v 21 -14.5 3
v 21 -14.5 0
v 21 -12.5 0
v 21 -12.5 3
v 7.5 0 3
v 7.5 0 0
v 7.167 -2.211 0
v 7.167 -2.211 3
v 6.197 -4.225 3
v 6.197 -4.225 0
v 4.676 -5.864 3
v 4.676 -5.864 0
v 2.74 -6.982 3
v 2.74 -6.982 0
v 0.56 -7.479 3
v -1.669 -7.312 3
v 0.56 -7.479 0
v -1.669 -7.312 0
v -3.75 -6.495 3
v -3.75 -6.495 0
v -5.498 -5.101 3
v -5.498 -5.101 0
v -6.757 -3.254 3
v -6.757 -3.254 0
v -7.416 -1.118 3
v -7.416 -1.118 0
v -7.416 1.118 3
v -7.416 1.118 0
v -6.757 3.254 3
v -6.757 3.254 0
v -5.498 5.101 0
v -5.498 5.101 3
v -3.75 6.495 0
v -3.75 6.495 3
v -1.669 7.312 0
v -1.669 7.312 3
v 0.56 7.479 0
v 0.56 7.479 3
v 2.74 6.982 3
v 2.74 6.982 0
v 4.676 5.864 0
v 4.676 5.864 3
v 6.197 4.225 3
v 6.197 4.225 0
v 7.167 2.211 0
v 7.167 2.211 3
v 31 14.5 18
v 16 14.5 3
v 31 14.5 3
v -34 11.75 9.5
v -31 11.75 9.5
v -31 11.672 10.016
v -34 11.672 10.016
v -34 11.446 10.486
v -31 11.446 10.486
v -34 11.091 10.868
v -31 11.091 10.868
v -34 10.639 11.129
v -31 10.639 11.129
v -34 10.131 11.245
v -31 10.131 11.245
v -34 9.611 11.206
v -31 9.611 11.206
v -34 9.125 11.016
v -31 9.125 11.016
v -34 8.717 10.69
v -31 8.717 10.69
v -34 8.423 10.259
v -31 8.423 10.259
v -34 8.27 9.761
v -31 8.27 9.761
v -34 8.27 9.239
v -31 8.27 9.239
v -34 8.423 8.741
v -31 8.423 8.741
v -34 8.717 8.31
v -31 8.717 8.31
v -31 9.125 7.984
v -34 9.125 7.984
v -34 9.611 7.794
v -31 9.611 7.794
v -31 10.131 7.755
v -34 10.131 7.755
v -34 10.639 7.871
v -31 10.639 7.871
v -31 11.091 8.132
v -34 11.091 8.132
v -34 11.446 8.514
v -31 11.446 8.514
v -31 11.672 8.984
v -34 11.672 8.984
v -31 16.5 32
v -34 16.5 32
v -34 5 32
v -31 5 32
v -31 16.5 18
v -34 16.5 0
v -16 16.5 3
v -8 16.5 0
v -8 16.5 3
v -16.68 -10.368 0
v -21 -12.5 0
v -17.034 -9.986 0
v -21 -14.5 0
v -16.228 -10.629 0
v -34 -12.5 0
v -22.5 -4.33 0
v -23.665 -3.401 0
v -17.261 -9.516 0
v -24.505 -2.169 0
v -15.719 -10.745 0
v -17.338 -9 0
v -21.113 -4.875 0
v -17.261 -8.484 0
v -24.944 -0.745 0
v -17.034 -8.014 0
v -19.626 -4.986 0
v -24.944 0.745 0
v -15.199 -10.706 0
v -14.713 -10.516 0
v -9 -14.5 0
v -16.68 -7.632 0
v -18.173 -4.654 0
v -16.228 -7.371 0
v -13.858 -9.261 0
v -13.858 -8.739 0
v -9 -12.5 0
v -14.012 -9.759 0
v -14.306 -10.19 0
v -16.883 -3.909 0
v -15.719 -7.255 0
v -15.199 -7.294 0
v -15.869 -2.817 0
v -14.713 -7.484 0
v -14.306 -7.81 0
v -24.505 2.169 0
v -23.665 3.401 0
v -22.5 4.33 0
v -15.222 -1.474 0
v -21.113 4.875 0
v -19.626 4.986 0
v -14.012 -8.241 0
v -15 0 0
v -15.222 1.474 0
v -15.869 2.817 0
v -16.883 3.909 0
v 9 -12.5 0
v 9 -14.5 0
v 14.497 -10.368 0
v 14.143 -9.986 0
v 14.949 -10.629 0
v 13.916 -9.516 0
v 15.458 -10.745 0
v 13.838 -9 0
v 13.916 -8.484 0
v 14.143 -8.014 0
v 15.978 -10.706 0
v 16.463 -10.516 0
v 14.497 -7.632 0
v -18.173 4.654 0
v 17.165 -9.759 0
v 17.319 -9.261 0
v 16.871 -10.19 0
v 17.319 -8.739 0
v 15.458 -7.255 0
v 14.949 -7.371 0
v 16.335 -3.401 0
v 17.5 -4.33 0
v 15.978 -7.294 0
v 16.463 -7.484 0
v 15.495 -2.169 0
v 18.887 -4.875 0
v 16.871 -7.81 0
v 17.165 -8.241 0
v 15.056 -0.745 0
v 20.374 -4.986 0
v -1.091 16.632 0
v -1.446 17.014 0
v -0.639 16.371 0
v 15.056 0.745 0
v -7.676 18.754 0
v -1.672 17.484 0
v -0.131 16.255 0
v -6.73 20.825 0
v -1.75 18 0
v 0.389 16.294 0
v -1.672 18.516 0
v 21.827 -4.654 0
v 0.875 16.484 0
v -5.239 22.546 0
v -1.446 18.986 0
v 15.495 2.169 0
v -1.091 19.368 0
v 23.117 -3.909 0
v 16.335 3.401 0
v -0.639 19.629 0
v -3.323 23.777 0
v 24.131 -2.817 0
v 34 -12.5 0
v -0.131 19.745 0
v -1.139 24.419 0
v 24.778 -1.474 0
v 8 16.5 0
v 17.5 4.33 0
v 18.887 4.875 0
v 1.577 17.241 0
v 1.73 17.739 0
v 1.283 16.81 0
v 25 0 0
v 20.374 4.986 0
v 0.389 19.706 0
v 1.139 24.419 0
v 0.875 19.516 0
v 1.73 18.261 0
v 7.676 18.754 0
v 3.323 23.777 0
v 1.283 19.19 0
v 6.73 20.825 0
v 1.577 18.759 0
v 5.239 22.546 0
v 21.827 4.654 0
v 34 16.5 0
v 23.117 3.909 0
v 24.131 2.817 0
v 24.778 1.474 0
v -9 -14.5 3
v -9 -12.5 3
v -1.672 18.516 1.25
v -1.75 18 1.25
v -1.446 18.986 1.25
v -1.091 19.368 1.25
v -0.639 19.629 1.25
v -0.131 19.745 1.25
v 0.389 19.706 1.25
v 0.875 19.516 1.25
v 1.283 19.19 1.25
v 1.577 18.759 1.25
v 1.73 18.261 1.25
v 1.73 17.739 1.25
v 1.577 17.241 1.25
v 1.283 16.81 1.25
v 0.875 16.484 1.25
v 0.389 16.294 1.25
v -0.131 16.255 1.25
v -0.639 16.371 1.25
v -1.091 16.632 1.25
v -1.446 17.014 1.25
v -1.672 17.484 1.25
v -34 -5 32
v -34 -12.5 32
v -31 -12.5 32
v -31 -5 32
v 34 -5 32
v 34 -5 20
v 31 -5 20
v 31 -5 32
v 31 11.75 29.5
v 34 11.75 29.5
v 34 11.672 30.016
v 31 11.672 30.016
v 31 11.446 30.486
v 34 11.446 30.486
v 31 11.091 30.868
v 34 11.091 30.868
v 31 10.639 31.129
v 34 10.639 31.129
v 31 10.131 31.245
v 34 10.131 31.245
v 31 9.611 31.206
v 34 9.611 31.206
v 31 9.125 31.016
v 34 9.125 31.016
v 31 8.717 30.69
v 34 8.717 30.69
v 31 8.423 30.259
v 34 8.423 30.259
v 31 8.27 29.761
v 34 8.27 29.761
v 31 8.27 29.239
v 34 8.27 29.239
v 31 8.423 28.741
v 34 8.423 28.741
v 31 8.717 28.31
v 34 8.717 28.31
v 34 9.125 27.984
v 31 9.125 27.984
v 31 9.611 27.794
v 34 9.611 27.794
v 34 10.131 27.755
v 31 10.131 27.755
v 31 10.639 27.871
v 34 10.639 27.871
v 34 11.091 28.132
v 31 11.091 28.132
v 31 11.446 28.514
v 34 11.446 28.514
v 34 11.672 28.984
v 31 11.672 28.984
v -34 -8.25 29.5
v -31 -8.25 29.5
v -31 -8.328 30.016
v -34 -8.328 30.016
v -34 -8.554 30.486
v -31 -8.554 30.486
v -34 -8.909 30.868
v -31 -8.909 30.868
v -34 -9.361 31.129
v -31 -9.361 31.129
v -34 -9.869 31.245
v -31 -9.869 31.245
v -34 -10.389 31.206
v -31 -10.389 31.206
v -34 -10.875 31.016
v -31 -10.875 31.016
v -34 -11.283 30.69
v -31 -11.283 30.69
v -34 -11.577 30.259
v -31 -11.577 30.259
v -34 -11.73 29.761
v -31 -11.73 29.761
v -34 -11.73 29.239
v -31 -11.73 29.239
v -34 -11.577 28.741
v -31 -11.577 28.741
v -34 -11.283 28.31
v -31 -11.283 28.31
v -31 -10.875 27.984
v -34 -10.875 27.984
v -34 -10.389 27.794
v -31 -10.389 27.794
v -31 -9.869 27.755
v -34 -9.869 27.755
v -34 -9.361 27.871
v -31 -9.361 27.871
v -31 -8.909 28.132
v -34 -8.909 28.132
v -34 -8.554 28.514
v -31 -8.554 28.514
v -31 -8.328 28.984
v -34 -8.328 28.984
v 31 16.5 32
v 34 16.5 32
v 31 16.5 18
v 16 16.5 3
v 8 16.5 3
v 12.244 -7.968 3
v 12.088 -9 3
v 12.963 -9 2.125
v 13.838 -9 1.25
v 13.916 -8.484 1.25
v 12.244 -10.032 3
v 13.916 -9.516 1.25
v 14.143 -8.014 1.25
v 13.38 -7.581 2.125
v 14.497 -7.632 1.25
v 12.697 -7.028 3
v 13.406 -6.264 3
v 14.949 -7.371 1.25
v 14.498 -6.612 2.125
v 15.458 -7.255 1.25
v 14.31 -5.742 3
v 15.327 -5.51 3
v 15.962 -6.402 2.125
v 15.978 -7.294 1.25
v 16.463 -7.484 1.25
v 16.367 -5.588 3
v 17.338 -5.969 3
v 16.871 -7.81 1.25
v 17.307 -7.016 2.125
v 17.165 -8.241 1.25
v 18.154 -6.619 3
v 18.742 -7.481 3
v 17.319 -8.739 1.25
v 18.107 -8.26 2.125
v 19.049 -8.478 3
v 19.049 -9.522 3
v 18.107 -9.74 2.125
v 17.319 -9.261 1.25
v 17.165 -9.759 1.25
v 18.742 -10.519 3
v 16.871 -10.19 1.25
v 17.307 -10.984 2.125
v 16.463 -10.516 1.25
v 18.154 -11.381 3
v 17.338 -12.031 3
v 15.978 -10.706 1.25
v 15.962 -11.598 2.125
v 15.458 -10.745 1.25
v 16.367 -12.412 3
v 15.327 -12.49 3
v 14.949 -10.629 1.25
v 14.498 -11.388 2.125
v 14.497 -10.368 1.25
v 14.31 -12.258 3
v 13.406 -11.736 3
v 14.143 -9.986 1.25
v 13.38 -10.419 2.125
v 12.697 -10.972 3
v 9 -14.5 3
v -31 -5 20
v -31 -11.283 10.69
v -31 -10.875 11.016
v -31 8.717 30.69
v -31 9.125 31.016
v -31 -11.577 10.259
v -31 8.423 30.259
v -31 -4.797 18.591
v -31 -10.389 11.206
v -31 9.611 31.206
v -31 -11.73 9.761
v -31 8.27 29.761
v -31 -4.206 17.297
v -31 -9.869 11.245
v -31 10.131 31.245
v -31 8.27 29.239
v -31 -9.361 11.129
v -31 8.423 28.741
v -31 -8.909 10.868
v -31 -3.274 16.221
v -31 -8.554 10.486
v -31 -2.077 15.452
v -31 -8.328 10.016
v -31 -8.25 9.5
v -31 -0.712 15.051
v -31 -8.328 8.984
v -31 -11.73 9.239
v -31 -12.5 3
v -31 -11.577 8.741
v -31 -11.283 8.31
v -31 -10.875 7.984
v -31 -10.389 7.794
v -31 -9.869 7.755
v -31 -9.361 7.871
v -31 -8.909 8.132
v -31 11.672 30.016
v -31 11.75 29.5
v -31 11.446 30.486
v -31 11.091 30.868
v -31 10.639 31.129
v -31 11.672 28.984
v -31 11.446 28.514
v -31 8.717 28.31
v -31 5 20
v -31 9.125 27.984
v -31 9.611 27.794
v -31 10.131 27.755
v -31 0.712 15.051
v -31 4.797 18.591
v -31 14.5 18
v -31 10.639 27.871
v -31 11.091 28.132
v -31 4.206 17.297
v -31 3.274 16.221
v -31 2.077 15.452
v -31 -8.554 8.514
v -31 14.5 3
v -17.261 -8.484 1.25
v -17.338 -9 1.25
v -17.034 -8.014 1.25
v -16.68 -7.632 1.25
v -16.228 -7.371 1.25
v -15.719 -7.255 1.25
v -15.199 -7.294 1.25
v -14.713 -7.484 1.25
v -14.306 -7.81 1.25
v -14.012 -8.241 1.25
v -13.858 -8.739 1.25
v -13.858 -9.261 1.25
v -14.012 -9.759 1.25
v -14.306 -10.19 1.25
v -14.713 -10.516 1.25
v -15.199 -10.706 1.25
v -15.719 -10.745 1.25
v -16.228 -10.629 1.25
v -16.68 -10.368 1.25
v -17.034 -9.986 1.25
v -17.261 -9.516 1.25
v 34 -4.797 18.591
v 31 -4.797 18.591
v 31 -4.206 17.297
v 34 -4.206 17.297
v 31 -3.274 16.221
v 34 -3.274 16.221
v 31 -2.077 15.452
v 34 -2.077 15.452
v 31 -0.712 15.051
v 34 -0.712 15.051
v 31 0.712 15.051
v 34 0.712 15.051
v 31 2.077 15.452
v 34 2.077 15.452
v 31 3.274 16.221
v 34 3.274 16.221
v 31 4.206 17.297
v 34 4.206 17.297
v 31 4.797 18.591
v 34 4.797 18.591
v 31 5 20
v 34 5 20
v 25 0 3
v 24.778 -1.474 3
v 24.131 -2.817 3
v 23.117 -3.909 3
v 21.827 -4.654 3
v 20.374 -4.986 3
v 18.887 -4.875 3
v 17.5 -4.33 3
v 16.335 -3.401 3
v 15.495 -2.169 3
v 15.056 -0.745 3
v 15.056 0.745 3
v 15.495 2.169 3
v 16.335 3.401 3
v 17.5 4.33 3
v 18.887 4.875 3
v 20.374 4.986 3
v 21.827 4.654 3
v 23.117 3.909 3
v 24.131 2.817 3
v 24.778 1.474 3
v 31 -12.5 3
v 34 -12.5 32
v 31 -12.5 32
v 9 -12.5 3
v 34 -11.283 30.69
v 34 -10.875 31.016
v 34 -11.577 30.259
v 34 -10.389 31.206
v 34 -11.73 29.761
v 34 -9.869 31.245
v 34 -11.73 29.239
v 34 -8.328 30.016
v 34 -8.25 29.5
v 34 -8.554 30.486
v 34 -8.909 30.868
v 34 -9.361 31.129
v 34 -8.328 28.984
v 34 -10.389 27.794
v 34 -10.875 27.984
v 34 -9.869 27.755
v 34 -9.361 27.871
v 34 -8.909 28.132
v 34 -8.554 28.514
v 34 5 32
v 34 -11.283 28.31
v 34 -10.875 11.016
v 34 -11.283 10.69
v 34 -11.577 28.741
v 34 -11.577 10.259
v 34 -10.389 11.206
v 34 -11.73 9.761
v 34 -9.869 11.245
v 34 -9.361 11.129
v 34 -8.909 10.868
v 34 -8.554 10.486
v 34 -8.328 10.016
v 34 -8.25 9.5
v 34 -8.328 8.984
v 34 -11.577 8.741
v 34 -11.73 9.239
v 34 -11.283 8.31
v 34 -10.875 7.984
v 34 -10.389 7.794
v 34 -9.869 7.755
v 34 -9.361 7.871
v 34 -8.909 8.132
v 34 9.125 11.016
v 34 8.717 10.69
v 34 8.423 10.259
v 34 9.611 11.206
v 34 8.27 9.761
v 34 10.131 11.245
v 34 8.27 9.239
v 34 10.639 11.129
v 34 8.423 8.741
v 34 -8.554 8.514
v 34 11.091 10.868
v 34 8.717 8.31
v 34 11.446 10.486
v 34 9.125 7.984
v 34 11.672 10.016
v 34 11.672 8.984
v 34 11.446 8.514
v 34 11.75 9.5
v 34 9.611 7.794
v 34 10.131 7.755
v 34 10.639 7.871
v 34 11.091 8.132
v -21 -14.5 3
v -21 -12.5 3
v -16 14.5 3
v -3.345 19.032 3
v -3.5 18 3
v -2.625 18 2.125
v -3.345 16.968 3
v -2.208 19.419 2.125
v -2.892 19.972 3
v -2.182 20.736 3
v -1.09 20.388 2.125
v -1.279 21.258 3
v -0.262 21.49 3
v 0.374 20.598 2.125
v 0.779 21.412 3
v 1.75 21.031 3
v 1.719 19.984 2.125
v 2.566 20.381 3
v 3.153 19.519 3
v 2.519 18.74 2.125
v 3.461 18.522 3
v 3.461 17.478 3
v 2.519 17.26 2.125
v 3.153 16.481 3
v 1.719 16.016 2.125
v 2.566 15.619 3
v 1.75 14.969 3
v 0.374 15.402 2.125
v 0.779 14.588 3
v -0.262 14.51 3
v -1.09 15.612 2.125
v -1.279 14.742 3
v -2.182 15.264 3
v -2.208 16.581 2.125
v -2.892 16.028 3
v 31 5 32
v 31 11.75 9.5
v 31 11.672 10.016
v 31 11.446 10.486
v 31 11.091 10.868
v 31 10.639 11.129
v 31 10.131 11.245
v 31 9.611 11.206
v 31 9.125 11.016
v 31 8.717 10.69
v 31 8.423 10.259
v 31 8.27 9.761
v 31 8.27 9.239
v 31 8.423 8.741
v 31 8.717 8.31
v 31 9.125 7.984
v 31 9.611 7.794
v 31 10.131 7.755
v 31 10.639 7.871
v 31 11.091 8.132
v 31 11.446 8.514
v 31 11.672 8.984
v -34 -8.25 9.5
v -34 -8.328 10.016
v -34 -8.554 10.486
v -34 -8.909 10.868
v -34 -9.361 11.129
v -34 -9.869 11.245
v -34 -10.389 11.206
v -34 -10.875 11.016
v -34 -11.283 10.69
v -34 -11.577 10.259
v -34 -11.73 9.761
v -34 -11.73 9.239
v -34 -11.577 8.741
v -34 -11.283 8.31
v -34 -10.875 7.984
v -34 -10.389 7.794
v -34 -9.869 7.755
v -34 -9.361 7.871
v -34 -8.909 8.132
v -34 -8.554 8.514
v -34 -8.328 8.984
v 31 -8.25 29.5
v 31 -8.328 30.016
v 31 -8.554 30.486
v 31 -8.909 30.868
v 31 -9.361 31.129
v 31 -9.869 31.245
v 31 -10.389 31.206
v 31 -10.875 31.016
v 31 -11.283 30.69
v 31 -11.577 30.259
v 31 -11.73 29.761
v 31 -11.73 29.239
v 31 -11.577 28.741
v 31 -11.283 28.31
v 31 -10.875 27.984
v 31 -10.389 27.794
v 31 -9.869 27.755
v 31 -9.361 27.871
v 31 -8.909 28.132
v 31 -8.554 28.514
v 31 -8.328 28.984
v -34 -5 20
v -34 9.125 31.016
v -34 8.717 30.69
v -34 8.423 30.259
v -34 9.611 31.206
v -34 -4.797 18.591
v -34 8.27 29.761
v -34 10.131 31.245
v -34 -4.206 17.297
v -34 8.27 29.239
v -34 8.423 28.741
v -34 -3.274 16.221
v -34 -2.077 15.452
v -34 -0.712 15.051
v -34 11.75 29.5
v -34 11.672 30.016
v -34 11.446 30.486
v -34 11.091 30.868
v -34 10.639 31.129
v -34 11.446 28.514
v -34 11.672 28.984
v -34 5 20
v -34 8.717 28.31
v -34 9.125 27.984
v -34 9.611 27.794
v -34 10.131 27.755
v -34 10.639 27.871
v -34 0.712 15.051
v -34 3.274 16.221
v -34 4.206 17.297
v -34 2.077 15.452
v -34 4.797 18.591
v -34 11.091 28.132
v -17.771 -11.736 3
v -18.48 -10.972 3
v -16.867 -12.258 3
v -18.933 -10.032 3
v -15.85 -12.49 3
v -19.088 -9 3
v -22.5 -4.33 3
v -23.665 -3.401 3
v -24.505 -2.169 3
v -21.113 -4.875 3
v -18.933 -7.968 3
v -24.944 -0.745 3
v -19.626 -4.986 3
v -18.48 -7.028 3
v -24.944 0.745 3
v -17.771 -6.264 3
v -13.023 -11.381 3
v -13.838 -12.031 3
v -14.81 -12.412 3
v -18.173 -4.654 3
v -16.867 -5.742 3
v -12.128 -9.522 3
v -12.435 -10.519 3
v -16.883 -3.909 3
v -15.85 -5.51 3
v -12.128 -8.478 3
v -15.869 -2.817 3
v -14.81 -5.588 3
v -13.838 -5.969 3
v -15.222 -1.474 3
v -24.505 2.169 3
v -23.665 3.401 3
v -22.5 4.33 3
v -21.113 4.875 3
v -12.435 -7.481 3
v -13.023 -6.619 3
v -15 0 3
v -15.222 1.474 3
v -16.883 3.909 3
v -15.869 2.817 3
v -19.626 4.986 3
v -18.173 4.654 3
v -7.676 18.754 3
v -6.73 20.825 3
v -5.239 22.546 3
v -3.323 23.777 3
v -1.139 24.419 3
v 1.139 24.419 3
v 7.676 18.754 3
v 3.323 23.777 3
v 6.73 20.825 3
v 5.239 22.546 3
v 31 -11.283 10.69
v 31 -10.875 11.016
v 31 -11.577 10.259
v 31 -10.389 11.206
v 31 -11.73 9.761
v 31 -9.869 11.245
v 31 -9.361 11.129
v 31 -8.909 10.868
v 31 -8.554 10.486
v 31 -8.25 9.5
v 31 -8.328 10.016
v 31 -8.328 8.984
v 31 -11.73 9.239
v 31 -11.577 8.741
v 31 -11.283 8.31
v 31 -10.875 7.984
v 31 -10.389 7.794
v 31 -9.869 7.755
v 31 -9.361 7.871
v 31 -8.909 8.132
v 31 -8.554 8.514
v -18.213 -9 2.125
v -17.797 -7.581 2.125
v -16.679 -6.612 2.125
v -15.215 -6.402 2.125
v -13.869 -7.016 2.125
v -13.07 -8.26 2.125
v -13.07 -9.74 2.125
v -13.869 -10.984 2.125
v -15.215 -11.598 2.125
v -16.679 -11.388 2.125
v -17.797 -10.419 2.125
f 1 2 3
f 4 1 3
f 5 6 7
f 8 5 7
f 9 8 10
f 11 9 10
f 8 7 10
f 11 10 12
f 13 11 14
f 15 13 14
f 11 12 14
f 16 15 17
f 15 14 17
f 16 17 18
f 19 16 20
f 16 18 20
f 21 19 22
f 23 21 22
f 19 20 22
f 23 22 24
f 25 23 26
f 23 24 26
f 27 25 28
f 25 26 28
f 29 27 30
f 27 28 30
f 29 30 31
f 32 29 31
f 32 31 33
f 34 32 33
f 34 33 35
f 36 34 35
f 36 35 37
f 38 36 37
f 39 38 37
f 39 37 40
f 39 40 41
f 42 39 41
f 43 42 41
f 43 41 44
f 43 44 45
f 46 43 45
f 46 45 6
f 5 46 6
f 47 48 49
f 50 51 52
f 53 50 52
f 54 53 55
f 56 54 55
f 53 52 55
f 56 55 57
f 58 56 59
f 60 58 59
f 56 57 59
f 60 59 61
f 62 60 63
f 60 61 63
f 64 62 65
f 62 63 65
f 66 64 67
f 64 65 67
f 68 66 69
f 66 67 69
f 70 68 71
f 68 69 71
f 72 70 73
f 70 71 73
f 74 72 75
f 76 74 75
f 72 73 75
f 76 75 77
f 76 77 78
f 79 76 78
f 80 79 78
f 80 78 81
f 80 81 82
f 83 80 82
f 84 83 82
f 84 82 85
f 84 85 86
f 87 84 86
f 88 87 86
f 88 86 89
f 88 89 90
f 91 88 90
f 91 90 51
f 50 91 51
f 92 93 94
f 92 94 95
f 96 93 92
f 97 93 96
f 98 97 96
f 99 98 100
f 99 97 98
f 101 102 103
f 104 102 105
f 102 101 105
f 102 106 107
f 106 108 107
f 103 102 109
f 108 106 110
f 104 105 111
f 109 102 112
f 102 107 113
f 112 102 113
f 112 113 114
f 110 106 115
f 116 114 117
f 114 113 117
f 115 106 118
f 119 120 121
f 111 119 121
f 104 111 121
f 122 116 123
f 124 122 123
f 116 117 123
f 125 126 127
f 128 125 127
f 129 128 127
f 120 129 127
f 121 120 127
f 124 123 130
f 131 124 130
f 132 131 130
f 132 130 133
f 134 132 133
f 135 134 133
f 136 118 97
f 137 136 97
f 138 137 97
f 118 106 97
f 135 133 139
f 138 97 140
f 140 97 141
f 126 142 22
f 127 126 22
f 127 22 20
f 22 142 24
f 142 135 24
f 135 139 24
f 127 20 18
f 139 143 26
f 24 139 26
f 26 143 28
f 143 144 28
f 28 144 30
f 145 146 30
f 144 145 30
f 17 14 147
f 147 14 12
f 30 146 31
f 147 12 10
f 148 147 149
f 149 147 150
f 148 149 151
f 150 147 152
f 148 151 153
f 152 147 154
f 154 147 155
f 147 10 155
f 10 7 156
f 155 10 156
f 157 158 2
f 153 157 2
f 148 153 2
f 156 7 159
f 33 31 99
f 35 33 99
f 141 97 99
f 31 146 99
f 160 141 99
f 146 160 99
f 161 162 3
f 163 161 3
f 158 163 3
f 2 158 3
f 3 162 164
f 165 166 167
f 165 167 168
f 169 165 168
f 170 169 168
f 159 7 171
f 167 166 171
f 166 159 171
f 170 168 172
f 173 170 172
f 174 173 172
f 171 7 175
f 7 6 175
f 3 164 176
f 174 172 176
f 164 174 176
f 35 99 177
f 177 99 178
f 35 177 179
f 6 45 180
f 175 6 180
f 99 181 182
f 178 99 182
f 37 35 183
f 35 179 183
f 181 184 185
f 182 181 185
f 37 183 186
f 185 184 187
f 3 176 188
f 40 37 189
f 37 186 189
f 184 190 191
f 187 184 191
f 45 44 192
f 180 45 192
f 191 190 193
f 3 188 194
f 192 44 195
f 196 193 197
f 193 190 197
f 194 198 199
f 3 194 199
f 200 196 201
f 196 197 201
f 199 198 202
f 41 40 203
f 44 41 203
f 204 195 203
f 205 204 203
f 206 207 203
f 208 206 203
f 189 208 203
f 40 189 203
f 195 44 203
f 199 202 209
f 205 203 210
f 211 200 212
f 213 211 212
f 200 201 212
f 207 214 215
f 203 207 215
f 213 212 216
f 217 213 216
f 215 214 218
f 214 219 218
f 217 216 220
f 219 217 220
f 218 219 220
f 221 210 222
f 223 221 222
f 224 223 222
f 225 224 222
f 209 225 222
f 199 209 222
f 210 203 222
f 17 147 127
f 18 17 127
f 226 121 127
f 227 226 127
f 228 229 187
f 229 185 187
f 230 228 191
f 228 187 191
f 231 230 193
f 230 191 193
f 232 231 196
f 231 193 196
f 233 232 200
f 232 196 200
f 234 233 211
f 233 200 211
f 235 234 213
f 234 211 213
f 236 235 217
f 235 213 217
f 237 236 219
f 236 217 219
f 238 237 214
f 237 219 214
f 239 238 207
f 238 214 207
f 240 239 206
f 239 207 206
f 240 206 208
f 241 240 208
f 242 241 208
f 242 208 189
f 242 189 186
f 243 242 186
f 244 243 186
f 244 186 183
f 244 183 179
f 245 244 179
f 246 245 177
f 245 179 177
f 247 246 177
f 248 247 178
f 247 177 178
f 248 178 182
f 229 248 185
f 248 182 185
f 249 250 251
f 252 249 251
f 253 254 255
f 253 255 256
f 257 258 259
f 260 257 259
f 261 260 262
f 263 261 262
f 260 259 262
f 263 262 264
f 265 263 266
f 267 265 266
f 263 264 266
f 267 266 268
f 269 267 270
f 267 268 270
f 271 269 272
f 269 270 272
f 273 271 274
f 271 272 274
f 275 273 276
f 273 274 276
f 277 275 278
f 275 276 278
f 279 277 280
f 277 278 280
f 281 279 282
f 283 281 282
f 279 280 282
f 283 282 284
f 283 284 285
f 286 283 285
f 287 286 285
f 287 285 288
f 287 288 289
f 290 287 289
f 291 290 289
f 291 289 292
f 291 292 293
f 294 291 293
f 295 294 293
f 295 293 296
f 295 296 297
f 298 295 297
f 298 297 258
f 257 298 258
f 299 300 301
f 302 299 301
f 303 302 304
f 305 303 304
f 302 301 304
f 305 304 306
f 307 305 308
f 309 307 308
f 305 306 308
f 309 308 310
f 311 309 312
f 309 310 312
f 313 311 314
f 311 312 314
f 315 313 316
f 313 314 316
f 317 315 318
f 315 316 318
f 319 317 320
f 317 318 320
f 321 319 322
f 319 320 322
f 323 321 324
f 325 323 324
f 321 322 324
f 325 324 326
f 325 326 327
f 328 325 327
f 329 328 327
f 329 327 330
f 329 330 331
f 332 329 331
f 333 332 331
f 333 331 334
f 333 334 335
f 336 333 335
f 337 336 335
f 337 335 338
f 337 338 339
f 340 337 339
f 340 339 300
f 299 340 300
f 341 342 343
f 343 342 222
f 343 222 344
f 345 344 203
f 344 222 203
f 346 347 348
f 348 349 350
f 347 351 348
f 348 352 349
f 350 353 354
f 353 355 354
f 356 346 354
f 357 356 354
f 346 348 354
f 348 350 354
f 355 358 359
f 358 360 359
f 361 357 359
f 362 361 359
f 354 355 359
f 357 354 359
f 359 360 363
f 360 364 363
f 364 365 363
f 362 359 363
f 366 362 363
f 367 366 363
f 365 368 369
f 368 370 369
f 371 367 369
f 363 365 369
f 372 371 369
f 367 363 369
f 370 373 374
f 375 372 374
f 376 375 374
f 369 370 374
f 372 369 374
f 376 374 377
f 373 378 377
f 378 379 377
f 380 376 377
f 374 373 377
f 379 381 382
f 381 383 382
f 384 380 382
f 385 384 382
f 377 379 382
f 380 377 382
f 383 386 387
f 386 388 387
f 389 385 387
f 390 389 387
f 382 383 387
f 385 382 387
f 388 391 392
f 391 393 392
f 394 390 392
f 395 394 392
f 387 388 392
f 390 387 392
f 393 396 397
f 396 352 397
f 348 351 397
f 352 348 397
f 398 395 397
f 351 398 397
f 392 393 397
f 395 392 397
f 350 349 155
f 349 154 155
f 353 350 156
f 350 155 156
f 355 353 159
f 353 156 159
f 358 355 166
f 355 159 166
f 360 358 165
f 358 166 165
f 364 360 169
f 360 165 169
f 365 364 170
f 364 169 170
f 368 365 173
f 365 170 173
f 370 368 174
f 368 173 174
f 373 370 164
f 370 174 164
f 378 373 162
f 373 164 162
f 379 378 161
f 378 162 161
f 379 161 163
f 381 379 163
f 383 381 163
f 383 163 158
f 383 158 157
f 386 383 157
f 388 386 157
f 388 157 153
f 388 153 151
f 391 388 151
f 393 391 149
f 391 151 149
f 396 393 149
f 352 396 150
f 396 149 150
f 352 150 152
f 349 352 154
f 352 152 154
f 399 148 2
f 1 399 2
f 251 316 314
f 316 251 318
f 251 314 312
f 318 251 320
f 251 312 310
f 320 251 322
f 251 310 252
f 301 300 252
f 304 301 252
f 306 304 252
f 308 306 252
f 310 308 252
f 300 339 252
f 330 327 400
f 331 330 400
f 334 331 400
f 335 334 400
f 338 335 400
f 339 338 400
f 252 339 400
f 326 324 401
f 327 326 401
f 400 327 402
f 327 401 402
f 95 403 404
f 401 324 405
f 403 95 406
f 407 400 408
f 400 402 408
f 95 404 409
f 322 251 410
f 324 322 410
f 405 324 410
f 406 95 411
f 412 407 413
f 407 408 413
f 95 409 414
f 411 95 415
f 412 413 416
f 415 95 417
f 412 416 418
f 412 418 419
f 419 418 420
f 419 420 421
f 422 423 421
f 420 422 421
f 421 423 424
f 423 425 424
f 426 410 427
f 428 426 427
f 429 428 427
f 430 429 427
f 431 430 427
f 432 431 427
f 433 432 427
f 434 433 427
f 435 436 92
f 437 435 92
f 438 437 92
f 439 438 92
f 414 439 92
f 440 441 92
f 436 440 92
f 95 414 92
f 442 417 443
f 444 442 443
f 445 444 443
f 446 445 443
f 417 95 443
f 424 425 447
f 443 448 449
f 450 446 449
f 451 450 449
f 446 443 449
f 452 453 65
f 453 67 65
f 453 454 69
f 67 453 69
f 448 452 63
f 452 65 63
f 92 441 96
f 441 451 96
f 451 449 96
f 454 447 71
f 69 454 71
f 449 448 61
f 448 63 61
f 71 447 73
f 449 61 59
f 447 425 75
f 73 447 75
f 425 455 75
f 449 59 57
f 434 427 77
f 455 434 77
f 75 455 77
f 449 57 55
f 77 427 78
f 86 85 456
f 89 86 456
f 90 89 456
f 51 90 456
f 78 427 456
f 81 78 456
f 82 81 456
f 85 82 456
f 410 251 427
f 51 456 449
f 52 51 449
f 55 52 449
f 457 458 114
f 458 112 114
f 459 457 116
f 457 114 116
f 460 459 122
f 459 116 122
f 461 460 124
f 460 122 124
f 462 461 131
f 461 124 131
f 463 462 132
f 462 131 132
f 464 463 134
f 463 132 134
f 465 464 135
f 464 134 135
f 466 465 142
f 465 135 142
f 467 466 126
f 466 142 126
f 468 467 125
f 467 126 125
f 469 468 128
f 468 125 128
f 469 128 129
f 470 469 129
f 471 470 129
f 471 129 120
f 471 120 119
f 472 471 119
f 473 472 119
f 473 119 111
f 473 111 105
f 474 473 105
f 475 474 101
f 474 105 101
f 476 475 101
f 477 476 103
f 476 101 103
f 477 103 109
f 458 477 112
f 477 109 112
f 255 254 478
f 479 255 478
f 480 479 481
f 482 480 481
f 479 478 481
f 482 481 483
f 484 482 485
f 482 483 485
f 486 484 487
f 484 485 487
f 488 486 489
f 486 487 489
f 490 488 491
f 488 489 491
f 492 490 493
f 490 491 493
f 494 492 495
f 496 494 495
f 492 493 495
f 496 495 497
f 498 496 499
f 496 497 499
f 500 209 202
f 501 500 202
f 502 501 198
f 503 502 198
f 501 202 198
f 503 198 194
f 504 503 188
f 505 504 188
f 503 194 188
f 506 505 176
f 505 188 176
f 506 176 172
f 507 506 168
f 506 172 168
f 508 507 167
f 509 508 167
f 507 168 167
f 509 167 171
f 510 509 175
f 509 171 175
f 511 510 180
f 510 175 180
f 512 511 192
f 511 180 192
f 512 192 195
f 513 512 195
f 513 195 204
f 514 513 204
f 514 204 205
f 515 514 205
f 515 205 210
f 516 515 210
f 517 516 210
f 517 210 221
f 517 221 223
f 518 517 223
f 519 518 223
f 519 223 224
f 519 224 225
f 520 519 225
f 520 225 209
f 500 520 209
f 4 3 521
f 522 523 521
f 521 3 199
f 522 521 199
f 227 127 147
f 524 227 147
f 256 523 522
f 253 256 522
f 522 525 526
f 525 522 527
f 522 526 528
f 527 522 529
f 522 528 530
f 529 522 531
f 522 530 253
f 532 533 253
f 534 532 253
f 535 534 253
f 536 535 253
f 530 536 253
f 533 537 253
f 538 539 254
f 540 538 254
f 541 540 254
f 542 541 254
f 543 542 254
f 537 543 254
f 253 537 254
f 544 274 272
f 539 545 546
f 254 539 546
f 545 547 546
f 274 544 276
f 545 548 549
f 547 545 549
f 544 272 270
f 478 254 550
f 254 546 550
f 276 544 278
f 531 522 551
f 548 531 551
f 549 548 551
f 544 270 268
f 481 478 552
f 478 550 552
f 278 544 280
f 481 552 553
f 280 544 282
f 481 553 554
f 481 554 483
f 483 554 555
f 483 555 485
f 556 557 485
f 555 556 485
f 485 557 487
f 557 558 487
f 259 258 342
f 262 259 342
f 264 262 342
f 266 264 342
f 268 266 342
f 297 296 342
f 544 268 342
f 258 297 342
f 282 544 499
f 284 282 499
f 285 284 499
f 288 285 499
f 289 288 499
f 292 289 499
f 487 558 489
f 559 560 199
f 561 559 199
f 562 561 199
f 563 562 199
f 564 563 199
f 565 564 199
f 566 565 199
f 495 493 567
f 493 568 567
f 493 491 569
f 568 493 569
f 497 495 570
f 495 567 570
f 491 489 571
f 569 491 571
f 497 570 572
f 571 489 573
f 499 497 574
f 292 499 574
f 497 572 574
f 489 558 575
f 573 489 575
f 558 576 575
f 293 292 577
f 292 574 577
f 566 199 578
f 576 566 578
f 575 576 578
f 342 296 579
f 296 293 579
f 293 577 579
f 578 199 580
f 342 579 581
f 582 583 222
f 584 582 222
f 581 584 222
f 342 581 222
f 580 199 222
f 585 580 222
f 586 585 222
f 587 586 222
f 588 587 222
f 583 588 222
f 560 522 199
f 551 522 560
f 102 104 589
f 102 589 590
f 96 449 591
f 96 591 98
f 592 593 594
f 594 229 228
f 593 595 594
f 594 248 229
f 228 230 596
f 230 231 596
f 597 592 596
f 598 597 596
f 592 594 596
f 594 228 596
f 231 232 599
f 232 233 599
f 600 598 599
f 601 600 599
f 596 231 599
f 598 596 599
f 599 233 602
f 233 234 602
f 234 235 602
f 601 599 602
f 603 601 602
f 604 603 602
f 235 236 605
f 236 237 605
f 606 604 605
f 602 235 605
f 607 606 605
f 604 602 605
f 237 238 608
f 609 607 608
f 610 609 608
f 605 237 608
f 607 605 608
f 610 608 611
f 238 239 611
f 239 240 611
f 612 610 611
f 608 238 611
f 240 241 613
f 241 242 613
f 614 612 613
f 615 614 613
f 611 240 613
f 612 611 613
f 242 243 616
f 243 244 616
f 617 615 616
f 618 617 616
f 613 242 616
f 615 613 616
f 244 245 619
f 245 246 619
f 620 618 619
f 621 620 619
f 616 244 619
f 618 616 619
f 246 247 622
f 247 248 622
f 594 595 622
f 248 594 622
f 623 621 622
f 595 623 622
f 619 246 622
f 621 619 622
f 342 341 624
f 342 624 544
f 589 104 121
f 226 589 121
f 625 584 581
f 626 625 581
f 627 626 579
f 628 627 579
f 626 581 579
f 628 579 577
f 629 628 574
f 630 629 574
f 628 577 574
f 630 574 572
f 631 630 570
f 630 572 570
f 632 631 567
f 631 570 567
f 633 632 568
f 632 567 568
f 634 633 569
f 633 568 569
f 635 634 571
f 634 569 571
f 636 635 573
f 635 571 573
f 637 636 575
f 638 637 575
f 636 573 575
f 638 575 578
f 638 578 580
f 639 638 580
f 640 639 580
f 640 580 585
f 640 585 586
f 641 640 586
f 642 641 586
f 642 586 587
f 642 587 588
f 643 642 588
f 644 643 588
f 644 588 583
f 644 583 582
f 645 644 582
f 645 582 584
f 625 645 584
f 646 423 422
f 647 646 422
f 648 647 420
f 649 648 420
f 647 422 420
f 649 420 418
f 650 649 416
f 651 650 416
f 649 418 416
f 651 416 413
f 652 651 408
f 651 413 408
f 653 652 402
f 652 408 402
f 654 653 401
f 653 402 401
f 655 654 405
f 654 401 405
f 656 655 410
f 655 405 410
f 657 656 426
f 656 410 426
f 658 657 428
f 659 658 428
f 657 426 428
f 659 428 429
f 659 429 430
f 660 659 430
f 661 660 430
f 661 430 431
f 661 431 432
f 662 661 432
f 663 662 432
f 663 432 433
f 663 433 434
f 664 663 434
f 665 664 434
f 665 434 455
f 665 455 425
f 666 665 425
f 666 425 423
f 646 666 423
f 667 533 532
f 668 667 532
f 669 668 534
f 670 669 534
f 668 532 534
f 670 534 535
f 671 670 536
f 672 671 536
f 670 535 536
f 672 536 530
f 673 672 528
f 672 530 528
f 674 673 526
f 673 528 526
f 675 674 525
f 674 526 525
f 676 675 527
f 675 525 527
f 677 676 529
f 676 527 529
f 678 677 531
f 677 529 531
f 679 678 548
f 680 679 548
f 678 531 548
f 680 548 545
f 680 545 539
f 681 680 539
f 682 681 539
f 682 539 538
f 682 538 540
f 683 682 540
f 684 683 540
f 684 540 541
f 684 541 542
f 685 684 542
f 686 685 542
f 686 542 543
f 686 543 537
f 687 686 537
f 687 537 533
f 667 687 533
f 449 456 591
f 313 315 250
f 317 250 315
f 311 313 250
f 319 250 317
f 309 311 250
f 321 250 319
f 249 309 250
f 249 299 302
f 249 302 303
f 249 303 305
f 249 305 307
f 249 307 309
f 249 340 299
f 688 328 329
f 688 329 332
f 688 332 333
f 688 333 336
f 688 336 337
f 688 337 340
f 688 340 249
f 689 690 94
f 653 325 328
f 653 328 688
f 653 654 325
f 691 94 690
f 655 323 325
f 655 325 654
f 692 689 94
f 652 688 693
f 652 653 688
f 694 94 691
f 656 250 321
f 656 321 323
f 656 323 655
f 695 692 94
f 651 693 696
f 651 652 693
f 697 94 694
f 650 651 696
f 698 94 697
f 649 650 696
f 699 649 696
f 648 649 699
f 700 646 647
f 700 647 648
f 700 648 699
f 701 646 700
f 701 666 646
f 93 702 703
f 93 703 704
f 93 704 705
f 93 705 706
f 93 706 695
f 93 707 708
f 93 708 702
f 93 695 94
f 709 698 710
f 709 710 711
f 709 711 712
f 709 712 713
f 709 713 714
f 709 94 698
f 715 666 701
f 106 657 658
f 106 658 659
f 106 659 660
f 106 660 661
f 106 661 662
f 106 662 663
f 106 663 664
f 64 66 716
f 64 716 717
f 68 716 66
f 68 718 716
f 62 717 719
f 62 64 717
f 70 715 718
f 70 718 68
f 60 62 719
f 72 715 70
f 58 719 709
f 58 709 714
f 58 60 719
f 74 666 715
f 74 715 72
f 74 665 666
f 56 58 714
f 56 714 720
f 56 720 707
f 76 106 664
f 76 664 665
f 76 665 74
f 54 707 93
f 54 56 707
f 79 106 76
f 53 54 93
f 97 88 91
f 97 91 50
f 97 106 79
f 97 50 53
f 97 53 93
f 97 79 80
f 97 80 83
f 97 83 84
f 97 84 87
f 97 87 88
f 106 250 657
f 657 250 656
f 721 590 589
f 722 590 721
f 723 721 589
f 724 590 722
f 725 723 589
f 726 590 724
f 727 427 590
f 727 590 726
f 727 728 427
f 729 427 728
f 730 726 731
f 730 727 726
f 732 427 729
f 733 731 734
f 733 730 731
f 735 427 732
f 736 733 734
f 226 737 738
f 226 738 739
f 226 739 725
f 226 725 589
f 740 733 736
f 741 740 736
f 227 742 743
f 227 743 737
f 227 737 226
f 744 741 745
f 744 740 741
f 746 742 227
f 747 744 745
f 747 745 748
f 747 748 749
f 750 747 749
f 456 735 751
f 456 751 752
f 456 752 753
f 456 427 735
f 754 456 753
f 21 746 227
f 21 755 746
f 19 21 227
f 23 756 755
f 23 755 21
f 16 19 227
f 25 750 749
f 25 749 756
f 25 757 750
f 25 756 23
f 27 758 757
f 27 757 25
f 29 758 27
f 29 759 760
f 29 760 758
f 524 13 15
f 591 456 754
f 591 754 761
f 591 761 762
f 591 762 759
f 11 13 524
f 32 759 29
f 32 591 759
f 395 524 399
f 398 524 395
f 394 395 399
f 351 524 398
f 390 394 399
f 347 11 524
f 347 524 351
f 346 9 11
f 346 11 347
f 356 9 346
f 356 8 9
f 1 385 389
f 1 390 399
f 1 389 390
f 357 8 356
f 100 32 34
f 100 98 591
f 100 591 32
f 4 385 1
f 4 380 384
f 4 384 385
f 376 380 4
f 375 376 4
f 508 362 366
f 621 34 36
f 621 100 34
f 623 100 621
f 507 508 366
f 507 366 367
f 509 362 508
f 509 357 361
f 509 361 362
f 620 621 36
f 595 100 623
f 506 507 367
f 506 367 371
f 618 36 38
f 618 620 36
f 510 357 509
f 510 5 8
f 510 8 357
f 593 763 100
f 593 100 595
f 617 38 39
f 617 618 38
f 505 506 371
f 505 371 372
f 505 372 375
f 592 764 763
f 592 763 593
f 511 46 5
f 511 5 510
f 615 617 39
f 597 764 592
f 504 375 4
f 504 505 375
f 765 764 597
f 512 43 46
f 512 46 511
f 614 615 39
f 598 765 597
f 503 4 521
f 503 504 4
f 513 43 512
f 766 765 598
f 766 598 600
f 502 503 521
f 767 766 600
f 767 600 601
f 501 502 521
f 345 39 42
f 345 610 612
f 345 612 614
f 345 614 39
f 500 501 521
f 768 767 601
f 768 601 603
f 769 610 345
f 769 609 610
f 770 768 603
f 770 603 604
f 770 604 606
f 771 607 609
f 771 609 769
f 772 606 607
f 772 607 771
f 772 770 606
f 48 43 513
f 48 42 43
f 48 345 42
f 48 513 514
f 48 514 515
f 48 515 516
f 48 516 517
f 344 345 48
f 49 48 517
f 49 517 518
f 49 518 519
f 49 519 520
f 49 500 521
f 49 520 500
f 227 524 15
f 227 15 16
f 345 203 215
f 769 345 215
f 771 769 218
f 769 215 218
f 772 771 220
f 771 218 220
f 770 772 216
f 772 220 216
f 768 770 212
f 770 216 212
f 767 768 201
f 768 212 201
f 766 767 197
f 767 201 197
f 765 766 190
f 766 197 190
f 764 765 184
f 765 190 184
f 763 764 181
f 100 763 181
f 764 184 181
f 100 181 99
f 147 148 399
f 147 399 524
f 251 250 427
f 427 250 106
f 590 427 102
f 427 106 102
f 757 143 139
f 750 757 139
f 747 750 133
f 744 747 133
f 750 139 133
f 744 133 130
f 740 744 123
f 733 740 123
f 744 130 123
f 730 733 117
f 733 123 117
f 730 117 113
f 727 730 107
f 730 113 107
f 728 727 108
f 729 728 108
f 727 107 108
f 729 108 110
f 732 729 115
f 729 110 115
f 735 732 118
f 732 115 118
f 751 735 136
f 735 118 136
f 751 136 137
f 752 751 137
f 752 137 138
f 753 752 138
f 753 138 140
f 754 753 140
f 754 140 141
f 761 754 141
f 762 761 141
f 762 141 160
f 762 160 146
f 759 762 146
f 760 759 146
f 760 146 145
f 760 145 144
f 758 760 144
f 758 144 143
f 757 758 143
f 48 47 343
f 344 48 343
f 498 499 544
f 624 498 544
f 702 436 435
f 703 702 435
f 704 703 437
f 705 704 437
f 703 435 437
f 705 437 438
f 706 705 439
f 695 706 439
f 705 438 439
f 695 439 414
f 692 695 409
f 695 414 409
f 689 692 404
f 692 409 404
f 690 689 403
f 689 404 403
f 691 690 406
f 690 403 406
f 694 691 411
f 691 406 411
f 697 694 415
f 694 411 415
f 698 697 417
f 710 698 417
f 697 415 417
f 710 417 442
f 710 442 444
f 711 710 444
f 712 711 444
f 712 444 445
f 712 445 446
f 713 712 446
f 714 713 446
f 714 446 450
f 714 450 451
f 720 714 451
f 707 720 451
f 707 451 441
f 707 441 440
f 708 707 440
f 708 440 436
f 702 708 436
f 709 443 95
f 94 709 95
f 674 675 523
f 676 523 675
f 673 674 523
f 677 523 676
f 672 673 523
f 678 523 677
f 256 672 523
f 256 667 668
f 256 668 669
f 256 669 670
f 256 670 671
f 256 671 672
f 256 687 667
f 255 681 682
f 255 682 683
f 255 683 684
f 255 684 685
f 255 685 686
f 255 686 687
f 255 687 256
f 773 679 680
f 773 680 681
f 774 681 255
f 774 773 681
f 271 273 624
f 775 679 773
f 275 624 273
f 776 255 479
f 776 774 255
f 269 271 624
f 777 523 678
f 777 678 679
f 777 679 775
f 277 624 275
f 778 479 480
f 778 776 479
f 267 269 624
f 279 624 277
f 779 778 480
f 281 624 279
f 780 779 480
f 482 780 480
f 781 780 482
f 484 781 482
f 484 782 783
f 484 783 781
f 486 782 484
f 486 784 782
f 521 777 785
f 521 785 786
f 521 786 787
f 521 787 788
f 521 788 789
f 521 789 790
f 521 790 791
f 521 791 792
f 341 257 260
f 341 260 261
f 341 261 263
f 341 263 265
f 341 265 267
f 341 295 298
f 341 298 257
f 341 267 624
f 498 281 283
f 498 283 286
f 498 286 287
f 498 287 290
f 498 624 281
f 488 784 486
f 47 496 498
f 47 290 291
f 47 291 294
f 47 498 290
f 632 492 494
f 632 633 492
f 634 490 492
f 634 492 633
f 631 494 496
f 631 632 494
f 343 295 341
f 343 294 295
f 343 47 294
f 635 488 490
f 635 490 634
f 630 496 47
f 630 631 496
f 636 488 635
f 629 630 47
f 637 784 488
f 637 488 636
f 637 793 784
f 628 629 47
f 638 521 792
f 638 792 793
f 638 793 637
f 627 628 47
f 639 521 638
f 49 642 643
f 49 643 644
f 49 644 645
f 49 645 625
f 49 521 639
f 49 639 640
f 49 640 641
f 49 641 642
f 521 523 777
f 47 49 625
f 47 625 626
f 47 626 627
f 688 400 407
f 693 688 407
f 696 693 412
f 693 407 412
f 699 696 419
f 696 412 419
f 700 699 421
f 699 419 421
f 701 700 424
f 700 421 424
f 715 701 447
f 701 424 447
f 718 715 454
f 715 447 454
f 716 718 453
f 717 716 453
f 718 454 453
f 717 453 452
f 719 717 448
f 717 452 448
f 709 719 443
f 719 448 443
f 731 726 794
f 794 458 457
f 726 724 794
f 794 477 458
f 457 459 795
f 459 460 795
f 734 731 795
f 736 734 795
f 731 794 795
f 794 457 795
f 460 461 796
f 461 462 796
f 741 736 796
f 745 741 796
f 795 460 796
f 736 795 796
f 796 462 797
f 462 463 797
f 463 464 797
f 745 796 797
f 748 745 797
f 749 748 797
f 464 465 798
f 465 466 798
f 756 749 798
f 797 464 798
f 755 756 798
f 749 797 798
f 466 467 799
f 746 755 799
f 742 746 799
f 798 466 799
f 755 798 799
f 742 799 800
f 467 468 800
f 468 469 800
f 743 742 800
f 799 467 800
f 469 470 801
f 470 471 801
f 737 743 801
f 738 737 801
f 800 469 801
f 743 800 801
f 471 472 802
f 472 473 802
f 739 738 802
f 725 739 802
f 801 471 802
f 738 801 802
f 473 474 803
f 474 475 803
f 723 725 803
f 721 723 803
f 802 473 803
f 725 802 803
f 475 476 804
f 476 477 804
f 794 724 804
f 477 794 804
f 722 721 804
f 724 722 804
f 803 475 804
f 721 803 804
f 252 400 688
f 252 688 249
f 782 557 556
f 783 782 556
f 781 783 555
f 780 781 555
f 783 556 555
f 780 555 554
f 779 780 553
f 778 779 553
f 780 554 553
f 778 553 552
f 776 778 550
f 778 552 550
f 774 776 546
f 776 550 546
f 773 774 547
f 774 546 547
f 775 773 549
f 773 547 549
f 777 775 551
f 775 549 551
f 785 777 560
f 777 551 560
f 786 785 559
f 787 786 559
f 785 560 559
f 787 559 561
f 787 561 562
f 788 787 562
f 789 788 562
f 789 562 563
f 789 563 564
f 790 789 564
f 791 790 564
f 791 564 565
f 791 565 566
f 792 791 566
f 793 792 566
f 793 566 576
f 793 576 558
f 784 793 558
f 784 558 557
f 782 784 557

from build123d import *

# Parameters (mm, degrees)
F0_W            = 12
F0_H            = 2
F1_DEPTH        = 3
F2_W            = 3
F2_H            = 29
F3_DEPTH        = 29
F4_W            = 15
F4_H            = 2
F5_DEPTH        = 15
F6_SIZE         = 14.99999
F8_D            = 3.5
F10_D           = 3.5
F10_CSINK_D     = 7
F10_CSINK_ANGLE = 90
F11_R           = 7.5
F11_R_2         = 5
F12_DEPTH       = 25
F13_W           = 10
F13_H           = 12
F14_DEPTH       = 68.001


# Not quite as in the source:
# - a fillet or chamfer is up to 0.001 mm smaller than in the source, because OpenCascade refuses the exact size
# - a feature names something its author has since deleted; it is built from what else it names


with BuildPart() as f1:
    # F0 (on Top) → F1 (new body)
    with BuildSketch(Plane.XY):
        Polygon((34, -12.5), (34, 16.5), (8, 16.5), (-8, 16.5), (-34, 16.5), (-34, -12.5), (-21, -12.5), (-9, -12.5), (9, -12.5), (21, -12.5), align=None)
        with BuildLine():
            Line((-8, 16.5), (8, 16.5))
            ThreePointArc((8, 16.5), (0, 24.5), (-8, 16.5))
        make_face()
        with Locations((-15, -13.5)):
            Rectangle(F0_W, F0_H)
        with Locations((15, -13.5)):
            Rectangle(F0_W, F0_H)
    extrude(amount=F1_DEPTH)

    # F2 (on face) → F3 (join)
    with BuildSketch(Plane.XY.offset(3)):
        with Locations((-32.5, 2)):
            Rectangle(F2_W, F2_H)
        with Locations((32.5, 2)):
            Rectangle(F2_W, F2_H)
    extrude(amount=F3_DEPTH)

    # F4 (on face) → F5 (join)
    with BuildSketch(Plane.XY.offset(3)):
        with Locations((-23.5, 15.5)):
            Rectangle(F4_W, F4_H)
        with Locations((23.5, 15.5)):
            Rectangle(F4_W, F4_H)
    extrude(amount=F5_DEPTH)

    # F6 (size 15 in the source; OpenCascade refuses exactly that, so slightly less here)
    f6_edges = [f1.edges().sort_by_distance(p)[0] for p in [
        (-16, 15.5, 18),
        (16, 15.5, 18),
    ]]
    chamfer(f6_edges, length=F6_SIZE)

    # F8 (through all)
    with Locations(Plane(origin=(-34, 0, 0), x_dir=(0, -1, 0), z_dir=(-1, 0, 0))):
        with Locations((10, 29.5), (10, 9.5), (-10, 9.5), (-10, 29.5)):
            Hole(F8_D / 2)

    # F10 (through all)
    with Locations(Plane.XY.offset(3)):
        with Locations((0, 18), (-15.5884572681, -9), (15.5884572681, -9)):
            CounterSinkHole(F10_D / 2, F10_CSINK_D / 2, counter_sink_angle=F10_CSINK_ANGLE)

    # F11 (on face) → F12 (cut)
    with BuildSketch(Plane(origin=(0, 0, 0), x_dir=(1, 0, 0), z_dir=(0, 0, -1))):
        Circle(F11_R)
        with Locations((20, 0)):
            Circle(F11_R_2)
        with Locations((-20, 0)):
            Circle(F11_R_2)
    extrude(amount=-F12_DEPTH, mode=Mode.SUBTRACT)

    # F13 (on face) → F14 (cut, through all)
    with BuildSketch(Plane.YZ.offset(34)):
        with Locations((0, 26)):
            Rectangle(F13_W, F13_H)
        with BuildLine():
            ThreePointArc((-5, 20), (0, 15), (5, 20))
            Line((5, 20), (-5, 20))
        make_face()
    extrude(amount=-F14_DEPTH, mode=Mode.SUBTRACT)


solid = f1.part
